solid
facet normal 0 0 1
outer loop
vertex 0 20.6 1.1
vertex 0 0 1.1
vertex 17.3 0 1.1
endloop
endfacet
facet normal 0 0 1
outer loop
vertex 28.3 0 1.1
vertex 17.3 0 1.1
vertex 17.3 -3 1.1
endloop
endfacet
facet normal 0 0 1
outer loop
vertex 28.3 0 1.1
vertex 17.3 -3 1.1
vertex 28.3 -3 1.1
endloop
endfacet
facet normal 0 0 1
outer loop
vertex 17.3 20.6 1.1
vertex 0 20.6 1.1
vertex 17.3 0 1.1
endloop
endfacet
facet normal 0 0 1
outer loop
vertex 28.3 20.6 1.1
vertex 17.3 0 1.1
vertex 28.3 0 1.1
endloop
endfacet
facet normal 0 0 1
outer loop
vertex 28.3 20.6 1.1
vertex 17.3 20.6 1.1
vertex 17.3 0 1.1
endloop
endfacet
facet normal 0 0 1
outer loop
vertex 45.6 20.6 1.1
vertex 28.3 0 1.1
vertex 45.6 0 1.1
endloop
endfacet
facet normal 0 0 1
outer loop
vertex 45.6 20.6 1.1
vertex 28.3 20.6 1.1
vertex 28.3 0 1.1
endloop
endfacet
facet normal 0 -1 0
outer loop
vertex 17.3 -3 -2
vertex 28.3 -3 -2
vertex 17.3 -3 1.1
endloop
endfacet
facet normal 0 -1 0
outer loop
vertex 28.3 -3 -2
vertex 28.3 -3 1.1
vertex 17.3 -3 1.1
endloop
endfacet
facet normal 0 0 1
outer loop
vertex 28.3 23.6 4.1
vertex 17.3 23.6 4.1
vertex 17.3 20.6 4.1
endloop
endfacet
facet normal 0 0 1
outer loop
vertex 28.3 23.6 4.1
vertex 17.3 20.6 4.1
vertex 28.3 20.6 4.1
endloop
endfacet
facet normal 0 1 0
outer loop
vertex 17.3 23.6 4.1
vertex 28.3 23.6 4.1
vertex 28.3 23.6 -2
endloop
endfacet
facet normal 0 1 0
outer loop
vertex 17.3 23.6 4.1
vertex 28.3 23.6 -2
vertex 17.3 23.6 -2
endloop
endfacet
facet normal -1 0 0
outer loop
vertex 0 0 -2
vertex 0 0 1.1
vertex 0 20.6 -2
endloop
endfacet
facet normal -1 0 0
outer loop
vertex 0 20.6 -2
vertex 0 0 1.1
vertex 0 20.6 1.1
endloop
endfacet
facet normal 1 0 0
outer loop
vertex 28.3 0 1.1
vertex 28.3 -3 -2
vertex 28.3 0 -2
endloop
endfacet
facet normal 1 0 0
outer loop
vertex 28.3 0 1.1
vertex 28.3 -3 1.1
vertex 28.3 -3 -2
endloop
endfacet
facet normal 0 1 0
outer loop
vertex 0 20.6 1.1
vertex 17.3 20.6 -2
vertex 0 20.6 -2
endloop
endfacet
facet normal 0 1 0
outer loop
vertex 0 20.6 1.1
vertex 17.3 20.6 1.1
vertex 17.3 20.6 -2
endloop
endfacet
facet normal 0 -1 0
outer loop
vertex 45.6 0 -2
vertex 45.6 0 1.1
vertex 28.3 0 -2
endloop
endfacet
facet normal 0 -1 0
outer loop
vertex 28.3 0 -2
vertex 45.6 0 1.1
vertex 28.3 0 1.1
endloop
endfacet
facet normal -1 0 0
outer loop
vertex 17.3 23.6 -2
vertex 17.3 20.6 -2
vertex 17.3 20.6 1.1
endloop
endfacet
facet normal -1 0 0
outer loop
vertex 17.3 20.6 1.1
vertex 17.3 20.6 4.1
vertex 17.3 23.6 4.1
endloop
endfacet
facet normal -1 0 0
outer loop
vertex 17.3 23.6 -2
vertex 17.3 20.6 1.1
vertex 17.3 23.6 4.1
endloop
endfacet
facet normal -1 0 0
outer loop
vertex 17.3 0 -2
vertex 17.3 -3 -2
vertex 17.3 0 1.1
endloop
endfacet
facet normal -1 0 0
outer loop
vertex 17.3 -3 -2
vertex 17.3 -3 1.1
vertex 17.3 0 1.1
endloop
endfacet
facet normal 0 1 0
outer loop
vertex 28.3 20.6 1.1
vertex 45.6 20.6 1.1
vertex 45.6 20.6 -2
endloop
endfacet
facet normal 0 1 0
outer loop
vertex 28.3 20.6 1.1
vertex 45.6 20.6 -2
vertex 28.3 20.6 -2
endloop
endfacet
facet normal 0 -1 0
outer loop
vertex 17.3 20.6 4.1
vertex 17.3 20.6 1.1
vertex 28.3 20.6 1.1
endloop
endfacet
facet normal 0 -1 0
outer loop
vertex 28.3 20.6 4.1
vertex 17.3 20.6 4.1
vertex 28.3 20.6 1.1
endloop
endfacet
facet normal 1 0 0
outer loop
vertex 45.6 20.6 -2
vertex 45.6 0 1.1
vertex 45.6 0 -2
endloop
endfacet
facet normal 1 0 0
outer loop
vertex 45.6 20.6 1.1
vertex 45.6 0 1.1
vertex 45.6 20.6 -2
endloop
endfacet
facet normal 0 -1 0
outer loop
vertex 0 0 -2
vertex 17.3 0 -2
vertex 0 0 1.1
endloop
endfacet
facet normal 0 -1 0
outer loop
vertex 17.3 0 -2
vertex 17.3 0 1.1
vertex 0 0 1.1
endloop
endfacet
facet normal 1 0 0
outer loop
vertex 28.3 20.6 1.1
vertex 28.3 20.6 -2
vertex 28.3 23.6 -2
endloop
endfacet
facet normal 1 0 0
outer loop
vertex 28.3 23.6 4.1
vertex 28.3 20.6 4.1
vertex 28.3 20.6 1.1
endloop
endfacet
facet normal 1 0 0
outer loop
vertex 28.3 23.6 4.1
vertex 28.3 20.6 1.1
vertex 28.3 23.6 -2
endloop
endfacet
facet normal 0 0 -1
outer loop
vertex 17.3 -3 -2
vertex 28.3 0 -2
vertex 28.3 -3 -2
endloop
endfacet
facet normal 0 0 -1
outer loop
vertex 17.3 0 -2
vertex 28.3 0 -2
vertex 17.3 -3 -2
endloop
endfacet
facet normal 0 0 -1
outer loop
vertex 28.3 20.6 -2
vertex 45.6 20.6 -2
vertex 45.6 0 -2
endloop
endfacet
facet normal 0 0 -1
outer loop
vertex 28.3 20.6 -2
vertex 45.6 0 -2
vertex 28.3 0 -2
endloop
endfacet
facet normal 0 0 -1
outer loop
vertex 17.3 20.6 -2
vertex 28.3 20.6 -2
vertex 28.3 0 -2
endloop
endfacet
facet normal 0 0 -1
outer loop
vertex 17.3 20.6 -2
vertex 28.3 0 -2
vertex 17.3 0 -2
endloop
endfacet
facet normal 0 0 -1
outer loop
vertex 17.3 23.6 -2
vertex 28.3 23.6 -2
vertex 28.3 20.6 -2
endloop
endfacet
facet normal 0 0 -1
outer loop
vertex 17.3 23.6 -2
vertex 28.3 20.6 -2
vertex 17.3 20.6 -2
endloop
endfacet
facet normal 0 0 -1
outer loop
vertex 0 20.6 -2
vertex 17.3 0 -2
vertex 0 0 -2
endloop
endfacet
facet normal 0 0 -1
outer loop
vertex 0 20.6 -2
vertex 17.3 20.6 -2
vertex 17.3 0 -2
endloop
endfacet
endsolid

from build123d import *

# Parameters (mm, degrees)
SKETCH1_W           = 17.3
SKETCH1_H           = 20.6
SKETCH1_W_2         = 5.5
SKETCH1_H_2         = 3
BOSS_EXTRUDE1_DEPTH = 1.1
SKETCH2_W           = 11
SKETCH2_H           = 3
BOSS_EXTRUDE2_DEPTH = 3
SKETCH3_W           = 17.3
SKETCH3_H           = 20.6
SKETCH3_W_2         = 11
SKETCH3_H_2         = 3
BOSS_EXTRUDE3_DEPTH = 2


with BuildPart() as part:
    # Sketch1 → Boss-Extrude1 (new body)
    with BuildSketch(Plane.XY):
        with Locations((8.65, 10.3)):
            Rectangle(SKETCH1_W, SKETCH1_H)
        with Locations((20.05, 22.1)):
            Rectangle(SKETCH1_W_2, SKETCH1_H_2)
        with Locations((25.55, 22.1)):
            Rectangle(SKETCH1_W_2, SKETCH1_H_2)
        Polygon((28.3, 20.6), (22.8, 20.6), (17.3, 20.6), (17.3, 0), (22.8, 0), (28.3, 0), align=None)
        with Locations((36.95, 10.3)):
            Rectangle(SKETCH1_W, SKETCH1_H)
        with Locations((25.55, -1.5)):
            Rectangle(SKETCH1_W_2, SKETCH1_H_2)
        with Locations((20.05, -1.5)):
            Rectangle(SKETCH1_W_2, SKETCH1_H_2)
    extrude(amount=BOSS_EXTRUDE1_DEPTH)

    # Sketch2 → Boss-Extrude2 (add)
    with BuildSketch(Plane.XY.offset(1.1)):
        with Locations((22.8, 22.1)):
            Rectangle(SKETCH2_W, SKETCH2_H)
    extrude(amount=BOSS_EXTRUDE2_DEPTH)

    # Sketch3 → Boss-Extrude3 (add)
    with BuildSketch(Plane(origin=(0, 0, 0), x_dir=(-1, 0, 0), z_dir=(0, 0, -1))):
        with Locations((-36.95, 10.3)):
            Rectangle(SKETCH3_W, SKETCH3_H)
        with Locations((-22.8, 22.1)):
            Rectangle(SKETCH3_W_2, SKETCH3_H_2)
        with Locations((-22.8, 10.3)):
            Rectangle(SKETCH3_W_2, SKETCH3_H)
        with Locations((-8.65, 10.3)):
            Rectangle(SKETCH3_W, SKETCH3_H)
        with Locations((-22.8, -1.5)):
            Rectangle(SKETCH3_W_2, SKETCH3_H_2)
    extrude(amount=BOSS_EXTRUDE3_DEPTH)


solid = part.part
